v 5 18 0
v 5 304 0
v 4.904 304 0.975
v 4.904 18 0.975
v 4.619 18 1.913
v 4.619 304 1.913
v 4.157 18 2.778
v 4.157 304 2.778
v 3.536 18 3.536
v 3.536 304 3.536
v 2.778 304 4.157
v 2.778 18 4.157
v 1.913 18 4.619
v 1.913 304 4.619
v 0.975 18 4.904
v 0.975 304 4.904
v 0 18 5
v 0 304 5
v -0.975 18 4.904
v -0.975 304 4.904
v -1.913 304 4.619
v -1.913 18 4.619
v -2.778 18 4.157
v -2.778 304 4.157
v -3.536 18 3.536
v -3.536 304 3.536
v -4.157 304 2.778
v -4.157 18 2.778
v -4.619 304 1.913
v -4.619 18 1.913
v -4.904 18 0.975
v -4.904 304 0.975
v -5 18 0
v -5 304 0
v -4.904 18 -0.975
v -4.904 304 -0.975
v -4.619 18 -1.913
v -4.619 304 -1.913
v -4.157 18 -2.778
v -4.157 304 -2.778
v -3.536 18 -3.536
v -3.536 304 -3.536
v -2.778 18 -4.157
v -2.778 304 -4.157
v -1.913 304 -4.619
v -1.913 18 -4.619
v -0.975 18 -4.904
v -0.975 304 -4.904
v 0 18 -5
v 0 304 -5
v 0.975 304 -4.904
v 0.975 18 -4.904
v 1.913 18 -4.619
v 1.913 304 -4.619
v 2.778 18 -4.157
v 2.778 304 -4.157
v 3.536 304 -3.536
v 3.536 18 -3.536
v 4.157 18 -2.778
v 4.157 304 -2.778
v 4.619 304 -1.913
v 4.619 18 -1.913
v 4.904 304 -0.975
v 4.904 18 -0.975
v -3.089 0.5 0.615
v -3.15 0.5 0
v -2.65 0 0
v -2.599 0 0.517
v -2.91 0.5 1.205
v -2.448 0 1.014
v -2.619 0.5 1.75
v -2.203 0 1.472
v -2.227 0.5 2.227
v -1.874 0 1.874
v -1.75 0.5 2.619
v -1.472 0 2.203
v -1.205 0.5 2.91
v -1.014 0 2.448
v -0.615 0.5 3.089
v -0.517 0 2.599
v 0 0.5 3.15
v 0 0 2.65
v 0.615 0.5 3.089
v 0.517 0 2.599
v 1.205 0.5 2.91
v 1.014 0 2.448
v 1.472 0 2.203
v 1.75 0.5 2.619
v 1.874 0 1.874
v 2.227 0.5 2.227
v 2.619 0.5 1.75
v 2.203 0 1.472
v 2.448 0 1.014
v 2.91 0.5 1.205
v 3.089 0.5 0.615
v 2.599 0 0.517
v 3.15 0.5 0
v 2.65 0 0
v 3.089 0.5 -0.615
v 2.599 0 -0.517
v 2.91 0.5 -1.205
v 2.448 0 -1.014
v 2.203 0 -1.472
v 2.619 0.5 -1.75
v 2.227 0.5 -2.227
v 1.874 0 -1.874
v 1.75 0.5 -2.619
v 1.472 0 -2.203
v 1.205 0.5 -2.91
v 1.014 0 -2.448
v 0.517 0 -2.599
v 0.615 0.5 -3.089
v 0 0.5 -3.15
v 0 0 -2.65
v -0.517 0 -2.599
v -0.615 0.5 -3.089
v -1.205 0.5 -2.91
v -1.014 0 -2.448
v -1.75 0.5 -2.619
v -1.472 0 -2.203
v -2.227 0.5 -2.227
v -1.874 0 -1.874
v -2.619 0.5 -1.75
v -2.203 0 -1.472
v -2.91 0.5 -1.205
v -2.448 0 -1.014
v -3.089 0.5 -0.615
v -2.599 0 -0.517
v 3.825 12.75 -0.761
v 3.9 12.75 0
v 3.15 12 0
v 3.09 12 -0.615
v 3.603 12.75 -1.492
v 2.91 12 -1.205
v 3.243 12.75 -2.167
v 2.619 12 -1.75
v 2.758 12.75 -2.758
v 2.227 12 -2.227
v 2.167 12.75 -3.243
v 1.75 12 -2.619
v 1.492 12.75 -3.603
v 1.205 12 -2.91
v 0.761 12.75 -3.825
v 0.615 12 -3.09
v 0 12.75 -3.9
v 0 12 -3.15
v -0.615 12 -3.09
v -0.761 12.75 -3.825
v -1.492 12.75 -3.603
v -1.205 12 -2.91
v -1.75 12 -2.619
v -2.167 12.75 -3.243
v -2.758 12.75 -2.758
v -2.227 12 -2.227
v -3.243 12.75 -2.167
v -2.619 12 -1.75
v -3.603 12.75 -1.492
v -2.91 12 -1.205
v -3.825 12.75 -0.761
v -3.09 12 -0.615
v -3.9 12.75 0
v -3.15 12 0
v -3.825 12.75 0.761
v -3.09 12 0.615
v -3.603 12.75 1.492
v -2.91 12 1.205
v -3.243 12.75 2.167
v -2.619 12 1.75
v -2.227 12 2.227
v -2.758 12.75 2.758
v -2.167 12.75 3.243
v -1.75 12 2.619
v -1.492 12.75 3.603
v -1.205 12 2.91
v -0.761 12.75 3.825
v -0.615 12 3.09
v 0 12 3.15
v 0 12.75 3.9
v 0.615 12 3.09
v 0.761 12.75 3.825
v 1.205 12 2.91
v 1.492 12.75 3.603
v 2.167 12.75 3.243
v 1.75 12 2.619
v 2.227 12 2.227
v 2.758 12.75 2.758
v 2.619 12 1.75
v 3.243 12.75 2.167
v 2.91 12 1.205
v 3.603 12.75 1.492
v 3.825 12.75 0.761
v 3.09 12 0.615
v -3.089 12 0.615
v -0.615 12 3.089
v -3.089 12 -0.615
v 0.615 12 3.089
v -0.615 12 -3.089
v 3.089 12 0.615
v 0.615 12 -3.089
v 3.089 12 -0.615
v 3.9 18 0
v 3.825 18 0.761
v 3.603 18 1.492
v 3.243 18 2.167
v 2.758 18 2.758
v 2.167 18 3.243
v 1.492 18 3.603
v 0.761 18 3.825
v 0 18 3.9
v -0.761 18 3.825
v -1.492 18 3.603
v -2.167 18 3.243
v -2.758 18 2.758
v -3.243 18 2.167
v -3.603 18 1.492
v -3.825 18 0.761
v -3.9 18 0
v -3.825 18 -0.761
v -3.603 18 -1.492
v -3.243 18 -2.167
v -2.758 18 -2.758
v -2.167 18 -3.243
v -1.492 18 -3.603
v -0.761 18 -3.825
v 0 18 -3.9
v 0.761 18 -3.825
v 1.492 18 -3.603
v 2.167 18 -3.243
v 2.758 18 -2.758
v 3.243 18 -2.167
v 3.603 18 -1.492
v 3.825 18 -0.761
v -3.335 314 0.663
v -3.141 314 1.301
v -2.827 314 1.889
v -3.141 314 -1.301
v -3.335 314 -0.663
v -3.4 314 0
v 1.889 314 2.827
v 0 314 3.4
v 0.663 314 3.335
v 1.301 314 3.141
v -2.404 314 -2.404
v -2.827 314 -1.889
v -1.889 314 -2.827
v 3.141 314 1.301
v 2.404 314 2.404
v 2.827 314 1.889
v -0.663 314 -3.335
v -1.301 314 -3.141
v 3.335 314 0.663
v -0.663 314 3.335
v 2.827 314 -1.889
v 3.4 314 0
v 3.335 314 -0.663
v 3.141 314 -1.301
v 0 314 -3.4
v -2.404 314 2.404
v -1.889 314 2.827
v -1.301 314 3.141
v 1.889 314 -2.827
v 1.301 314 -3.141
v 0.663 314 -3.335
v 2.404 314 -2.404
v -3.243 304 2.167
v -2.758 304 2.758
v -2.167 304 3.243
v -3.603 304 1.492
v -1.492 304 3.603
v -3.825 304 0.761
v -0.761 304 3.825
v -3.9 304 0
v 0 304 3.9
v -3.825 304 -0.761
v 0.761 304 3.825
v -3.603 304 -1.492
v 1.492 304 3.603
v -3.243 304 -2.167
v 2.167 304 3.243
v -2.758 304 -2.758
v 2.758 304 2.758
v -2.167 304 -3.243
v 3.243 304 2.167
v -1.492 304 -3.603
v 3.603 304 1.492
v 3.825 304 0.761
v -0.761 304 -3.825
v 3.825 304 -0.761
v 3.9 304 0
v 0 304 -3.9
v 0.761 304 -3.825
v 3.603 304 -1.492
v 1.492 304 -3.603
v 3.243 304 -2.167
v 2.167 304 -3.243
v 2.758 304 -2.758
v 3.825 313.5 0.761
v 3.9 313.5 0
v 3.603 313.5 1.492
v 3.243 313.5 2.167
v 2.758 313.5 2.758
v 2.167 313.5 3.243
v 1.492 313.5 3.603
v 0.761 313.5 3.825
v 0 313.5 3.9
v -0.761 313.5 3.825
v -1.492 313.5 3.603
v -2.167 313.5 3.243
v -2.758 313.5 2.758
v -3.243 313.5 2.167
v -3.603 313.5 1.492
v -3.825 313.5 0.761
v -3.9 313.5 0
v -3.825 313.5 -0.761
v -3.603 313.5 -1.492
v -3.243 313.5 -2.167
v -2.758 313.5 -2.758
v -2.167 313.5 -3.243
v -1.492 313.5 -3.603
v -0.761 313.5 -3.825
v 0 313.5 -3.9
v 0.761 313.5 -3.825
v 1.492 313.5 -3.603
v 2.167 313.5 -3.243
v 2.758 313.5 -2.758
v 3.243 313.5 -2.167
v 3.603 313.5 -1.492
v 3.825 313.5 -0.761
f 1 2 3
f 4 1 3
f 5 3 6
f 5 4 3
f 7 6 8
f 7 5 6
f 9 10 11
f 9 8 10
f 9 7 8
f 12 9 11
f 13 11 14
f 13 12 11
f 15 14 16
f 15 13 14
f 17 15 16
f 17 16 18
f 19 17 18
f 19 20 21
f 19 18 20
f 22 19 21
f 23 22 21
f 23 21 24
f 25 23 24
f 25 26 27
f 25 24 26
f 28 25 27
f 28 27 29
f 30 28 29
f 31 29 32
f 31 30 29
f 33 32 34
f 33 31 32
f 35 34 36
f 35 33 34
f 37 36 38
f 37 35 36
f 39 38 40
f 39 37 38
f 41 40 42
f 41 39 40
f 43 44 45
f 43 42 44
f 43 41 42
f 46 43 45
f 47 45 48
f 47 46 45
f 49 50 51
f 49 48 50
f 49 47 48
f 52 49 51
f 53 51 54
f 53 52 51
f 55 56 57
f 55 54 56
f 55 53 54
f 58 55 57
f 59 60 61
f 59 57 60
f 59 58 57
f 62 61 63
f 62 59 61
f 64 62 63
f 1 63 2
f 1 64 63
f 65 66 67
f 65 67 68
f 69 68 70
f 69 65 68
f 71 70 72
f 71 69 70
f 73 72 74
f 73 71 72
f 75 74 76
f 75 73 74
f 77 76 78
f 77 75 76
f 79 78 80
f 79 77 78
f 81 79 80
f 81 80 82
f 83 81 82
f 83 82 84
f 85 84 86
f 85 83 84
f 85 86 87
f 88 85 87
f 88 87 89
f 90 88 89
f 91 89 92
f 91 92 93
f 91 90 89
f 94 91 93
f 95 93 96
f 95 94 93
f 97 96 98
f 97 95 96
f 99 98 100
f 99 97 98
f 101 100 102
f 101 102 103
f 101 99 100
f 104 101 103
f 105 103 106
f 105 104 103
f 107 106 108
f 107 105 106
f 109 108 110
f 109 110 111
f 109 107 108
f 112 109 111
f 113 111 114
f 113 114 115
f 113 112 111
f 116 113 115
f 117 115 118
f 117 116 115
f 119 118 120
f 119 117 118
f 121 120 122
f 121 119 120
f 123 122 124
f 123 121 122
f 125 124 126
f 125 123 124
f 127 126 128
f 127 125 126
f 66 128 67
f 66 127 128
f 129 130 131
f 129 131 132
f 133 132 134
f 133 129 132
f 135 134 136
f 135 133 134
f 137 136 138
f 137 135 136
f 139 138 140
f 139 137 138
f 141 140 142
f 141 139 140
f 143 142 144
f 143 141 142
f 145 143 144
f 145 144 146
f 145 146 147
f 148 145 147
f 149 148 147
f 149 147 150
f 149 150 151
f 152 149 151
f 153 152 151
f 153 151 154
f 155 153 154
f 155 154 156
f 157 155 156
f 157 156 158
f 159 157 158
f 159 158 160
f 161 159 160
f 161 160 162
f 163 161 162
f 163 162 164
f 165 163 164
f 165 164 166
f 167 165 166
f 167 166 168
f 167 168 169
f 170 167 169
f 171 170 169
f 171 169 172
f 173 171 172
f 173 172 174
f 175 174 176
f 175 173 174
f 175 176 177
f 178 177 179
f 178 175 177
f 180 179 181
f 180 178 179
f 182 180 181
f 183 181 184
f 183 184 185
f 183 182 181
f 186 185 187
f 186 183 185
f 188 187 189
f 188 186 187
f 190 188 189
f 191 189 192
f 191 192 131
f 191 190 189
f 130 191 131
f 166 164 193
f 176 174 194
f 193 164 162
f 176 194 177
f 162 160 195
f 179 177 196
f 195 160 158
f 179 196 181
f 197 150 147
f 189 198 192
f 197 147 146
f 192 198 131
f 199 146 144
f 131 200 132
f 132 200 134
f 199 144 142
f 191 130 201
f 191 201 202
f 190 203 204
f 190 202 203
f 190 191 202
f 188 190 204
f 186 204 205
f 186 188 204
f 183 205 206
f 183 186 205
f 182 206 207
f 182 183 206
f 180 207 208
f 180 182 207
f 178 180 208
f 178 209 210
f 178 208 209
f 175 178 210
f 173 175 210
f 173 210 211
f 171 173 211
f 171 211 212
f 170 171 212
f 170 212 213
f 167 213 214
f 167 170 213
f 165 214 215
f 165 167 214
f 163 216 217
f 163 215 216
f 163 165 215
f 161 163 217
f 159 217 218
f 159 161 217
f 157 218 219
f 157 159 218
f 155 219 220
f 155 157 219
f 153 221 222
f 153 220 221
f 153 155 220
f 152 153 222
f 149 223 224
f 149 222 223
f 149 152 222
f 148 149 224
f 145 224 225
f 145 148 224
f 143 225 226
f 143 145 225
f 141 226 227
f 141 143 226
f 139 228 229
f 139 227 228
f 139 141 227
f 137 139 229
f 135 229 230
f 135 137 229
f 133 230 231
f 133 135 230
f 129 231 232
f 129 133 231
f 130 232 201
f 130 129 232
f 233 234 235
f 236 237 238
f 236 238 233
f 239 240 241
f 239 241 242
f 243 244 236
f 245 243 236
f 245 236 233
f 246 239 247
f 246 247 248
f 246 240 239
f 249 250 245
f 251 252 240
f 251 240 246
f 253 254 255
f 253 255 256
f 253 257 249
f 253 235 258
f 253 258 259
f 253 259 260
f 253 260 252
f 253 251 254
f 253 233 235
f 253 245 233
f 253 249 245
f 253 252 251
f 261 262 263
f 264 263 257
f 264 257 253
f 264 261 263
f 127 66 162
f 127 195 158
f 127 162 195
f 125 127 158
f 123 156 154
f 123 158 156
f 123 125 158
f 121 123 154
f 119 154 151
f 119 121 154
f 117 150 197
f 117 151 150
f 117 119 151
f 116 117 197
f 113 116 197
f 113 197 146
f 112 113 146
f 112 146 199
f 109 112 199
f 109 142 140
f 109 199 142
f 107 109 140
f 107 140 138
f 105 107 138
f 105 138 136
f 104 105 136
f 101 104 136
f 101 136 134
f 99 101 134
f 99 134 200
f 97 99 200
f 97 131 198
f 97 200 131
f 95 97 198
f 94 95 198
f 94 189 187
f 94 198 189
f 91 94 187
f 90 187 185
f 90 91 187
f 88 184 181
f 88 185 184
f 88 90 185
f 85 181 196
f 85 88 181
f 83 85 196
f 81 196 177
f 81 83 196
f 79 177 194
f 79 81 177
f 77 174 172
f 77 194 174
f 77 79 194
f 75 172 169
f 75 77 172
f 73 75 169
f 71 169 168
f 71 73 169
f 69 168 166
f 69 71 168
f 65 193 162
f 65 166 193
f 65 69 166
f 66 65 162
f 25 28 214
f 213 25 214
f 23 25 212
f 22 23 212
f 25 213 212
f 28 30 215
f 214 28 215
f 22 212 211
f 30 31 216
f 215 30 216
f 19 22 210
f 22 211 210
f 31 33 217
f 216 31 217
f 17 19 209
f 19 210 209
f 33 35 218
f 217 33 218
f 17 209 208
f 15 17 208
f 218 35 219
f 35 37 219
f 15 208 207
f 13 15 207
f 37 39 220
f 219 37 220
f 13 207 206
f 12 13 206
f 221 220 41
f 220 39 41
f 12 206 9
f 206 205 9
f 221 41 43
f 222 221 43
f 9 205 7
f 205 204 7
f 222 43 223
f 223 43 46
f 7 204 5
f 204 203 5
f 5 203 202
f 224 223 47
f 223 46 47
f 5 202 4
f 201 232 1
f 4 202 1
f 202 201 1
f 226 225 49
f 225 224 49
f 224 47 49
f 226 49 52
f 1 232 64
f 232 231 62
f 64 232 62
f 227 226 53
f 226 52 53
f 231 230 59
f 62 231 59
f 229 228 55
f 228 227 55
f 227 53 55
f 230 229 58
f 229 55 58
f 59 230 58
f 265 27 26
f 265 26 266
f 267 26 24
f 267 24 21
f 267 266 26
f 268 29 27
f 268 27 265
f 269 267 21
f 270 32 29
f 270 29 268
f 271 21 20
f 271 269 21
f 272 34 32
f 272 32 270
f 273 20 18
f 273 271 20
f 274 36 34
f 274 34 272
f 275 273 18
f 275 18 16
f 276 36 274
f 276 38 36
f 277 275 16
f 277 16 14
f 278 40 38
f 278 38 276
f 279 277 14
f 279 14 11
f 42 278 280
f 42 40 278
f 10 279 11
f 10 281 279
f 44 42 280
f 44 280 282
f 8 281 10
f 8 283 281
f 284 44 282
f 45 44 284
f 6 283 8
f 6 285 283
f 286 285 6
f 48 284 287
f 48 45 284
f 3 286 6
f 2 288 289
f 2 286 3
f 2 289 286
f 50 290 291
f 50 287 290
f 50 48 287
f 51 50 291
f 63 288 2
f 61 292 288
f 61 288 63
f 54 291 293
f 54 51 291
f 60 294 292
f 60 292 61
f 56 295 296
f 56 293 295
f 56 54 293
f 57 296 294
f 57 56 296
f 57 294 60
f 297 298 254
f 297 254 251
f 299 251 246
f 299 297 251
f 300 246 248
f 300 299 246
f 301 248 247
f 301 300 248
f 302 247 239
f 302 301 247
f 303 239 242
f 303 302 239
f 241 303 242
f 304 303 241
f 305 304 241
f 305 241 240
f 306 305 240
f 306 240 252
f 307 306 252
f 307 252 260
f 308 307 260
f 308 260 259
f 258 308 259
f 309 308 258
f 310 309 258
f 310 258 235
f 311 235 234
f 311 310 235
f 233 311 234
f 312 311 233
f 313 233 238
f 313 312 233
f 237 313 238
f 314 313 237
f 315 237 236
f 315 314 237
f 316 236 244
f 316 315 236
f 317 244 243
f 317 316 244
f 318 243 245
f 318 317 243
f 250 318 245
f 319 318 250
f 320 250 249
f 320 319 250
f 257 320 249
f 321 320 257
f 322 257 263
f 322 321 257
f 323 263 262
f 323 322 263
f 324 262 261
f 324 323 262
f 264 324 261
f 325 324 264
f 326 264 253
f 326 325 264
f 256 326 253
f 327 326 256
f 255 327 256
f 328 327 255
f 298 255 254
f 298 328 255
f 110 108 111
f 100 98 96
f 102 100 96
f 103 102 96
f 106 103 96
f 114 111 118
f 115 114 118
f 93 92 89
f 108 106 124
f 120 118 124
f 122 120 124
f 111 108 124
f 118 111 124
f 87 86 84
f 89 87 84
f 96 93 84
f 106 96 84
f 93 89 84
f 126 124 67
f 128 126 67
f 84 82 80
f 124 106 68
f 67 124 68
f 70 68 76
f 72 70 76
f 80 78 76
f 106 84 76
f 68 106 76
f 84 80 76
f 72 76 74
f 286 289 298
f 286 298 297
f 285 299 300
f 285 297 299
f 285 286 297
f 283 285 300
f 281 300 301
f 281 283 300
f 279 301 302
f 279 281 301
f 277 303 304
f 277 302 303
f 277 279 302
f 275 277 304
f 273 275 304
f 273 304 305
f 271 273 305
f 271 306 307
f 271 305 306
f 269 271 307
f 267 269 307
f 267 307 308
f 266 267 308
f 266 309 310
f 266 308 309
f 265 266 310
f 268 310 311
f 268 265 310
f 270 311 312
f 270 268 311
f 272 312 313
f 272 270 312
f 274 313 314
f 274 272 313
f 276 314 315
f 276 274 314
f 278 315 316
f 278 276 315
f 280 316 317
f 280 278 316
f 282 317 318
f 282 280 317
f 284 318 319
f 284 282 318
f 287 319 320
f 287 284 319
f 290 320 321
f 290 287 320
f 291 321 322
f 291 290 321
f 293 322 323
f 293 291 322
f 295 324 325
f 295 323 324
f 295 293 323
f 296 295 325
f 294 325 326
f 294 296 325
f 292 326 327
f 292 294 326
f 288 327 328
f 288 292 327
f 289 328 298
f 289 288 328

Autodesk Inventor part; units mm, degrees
ref_plane "YZ Plane" through (0, 0, 0) normal (1, 0, 0) x (0, 1, 0)
ref_plane "XZ Plane" through (0, 0, 0) normal (0, 1, 0) x (-1, 0, 0)
ref_plane "XY Plane" through (0, 0, 0) normal (0, 0, 1) x (1, 0, 0)
sketch "Sketch1" plane through (0, 0, 0) normal (0, 1, 0) x (-1, 0, 0)
  circle A0 centre (0, 0) radius 3.15
  dimension "d0" = 6.3
extrude "Extrusion1" add sketch "Sketch1" along normal blind 12
sketch "Sketch2" plane through (0, 12, 0) normal (0, 1, 0) x (1, 0, 0)
  circle A0 centre (0, 0) radius 3.15 projected
  circle A1 centre (0, 0) radius 3.9
  dimension "d3" = 7.8
extrude "Extrusion2" add sketch "Sketch2" along normal blind 6 contours A0 | A1
chamfer "Chamfer1" distance 0.75 angle 45 1 edges at (-3.9, 12, 0)
sketch "Sketch3" plane through (0, 18, 0) normal (0, 1, 0) x (1, 0, 0)
  circle A0 centre (0, 0) radius 3.9 projected
  circle A1 centre (0, 0) radius 5
  dimension "d9" = 10
extrude "Extrusion3" add sketch "Sketch3" along normal blind 286 contours A0 | A1
sketch "Sketch4" plane through (0, 304, 0) normal (0, 1, 0) x (1, 0, 0)
  circle A0 centre (0, 0) radius 5 projected
  circle A1 centre (0, 0) radius 3.9
  dimension "d12" = 7.8
extrude "Extrusion4" add sketch "Sketch4" along normal blind 10 contours A1
chamfer "Chamfer2" distance 0.5 angle 45 2 edges at (-3.9, 314, 0) (3.15, 0, 0)
thread "Thread1" size "TR10x2" class "7e" standard "ISO Metric Trapezoidal Threads" full length
properties part number "ZACMEScrew" material "Steel"
